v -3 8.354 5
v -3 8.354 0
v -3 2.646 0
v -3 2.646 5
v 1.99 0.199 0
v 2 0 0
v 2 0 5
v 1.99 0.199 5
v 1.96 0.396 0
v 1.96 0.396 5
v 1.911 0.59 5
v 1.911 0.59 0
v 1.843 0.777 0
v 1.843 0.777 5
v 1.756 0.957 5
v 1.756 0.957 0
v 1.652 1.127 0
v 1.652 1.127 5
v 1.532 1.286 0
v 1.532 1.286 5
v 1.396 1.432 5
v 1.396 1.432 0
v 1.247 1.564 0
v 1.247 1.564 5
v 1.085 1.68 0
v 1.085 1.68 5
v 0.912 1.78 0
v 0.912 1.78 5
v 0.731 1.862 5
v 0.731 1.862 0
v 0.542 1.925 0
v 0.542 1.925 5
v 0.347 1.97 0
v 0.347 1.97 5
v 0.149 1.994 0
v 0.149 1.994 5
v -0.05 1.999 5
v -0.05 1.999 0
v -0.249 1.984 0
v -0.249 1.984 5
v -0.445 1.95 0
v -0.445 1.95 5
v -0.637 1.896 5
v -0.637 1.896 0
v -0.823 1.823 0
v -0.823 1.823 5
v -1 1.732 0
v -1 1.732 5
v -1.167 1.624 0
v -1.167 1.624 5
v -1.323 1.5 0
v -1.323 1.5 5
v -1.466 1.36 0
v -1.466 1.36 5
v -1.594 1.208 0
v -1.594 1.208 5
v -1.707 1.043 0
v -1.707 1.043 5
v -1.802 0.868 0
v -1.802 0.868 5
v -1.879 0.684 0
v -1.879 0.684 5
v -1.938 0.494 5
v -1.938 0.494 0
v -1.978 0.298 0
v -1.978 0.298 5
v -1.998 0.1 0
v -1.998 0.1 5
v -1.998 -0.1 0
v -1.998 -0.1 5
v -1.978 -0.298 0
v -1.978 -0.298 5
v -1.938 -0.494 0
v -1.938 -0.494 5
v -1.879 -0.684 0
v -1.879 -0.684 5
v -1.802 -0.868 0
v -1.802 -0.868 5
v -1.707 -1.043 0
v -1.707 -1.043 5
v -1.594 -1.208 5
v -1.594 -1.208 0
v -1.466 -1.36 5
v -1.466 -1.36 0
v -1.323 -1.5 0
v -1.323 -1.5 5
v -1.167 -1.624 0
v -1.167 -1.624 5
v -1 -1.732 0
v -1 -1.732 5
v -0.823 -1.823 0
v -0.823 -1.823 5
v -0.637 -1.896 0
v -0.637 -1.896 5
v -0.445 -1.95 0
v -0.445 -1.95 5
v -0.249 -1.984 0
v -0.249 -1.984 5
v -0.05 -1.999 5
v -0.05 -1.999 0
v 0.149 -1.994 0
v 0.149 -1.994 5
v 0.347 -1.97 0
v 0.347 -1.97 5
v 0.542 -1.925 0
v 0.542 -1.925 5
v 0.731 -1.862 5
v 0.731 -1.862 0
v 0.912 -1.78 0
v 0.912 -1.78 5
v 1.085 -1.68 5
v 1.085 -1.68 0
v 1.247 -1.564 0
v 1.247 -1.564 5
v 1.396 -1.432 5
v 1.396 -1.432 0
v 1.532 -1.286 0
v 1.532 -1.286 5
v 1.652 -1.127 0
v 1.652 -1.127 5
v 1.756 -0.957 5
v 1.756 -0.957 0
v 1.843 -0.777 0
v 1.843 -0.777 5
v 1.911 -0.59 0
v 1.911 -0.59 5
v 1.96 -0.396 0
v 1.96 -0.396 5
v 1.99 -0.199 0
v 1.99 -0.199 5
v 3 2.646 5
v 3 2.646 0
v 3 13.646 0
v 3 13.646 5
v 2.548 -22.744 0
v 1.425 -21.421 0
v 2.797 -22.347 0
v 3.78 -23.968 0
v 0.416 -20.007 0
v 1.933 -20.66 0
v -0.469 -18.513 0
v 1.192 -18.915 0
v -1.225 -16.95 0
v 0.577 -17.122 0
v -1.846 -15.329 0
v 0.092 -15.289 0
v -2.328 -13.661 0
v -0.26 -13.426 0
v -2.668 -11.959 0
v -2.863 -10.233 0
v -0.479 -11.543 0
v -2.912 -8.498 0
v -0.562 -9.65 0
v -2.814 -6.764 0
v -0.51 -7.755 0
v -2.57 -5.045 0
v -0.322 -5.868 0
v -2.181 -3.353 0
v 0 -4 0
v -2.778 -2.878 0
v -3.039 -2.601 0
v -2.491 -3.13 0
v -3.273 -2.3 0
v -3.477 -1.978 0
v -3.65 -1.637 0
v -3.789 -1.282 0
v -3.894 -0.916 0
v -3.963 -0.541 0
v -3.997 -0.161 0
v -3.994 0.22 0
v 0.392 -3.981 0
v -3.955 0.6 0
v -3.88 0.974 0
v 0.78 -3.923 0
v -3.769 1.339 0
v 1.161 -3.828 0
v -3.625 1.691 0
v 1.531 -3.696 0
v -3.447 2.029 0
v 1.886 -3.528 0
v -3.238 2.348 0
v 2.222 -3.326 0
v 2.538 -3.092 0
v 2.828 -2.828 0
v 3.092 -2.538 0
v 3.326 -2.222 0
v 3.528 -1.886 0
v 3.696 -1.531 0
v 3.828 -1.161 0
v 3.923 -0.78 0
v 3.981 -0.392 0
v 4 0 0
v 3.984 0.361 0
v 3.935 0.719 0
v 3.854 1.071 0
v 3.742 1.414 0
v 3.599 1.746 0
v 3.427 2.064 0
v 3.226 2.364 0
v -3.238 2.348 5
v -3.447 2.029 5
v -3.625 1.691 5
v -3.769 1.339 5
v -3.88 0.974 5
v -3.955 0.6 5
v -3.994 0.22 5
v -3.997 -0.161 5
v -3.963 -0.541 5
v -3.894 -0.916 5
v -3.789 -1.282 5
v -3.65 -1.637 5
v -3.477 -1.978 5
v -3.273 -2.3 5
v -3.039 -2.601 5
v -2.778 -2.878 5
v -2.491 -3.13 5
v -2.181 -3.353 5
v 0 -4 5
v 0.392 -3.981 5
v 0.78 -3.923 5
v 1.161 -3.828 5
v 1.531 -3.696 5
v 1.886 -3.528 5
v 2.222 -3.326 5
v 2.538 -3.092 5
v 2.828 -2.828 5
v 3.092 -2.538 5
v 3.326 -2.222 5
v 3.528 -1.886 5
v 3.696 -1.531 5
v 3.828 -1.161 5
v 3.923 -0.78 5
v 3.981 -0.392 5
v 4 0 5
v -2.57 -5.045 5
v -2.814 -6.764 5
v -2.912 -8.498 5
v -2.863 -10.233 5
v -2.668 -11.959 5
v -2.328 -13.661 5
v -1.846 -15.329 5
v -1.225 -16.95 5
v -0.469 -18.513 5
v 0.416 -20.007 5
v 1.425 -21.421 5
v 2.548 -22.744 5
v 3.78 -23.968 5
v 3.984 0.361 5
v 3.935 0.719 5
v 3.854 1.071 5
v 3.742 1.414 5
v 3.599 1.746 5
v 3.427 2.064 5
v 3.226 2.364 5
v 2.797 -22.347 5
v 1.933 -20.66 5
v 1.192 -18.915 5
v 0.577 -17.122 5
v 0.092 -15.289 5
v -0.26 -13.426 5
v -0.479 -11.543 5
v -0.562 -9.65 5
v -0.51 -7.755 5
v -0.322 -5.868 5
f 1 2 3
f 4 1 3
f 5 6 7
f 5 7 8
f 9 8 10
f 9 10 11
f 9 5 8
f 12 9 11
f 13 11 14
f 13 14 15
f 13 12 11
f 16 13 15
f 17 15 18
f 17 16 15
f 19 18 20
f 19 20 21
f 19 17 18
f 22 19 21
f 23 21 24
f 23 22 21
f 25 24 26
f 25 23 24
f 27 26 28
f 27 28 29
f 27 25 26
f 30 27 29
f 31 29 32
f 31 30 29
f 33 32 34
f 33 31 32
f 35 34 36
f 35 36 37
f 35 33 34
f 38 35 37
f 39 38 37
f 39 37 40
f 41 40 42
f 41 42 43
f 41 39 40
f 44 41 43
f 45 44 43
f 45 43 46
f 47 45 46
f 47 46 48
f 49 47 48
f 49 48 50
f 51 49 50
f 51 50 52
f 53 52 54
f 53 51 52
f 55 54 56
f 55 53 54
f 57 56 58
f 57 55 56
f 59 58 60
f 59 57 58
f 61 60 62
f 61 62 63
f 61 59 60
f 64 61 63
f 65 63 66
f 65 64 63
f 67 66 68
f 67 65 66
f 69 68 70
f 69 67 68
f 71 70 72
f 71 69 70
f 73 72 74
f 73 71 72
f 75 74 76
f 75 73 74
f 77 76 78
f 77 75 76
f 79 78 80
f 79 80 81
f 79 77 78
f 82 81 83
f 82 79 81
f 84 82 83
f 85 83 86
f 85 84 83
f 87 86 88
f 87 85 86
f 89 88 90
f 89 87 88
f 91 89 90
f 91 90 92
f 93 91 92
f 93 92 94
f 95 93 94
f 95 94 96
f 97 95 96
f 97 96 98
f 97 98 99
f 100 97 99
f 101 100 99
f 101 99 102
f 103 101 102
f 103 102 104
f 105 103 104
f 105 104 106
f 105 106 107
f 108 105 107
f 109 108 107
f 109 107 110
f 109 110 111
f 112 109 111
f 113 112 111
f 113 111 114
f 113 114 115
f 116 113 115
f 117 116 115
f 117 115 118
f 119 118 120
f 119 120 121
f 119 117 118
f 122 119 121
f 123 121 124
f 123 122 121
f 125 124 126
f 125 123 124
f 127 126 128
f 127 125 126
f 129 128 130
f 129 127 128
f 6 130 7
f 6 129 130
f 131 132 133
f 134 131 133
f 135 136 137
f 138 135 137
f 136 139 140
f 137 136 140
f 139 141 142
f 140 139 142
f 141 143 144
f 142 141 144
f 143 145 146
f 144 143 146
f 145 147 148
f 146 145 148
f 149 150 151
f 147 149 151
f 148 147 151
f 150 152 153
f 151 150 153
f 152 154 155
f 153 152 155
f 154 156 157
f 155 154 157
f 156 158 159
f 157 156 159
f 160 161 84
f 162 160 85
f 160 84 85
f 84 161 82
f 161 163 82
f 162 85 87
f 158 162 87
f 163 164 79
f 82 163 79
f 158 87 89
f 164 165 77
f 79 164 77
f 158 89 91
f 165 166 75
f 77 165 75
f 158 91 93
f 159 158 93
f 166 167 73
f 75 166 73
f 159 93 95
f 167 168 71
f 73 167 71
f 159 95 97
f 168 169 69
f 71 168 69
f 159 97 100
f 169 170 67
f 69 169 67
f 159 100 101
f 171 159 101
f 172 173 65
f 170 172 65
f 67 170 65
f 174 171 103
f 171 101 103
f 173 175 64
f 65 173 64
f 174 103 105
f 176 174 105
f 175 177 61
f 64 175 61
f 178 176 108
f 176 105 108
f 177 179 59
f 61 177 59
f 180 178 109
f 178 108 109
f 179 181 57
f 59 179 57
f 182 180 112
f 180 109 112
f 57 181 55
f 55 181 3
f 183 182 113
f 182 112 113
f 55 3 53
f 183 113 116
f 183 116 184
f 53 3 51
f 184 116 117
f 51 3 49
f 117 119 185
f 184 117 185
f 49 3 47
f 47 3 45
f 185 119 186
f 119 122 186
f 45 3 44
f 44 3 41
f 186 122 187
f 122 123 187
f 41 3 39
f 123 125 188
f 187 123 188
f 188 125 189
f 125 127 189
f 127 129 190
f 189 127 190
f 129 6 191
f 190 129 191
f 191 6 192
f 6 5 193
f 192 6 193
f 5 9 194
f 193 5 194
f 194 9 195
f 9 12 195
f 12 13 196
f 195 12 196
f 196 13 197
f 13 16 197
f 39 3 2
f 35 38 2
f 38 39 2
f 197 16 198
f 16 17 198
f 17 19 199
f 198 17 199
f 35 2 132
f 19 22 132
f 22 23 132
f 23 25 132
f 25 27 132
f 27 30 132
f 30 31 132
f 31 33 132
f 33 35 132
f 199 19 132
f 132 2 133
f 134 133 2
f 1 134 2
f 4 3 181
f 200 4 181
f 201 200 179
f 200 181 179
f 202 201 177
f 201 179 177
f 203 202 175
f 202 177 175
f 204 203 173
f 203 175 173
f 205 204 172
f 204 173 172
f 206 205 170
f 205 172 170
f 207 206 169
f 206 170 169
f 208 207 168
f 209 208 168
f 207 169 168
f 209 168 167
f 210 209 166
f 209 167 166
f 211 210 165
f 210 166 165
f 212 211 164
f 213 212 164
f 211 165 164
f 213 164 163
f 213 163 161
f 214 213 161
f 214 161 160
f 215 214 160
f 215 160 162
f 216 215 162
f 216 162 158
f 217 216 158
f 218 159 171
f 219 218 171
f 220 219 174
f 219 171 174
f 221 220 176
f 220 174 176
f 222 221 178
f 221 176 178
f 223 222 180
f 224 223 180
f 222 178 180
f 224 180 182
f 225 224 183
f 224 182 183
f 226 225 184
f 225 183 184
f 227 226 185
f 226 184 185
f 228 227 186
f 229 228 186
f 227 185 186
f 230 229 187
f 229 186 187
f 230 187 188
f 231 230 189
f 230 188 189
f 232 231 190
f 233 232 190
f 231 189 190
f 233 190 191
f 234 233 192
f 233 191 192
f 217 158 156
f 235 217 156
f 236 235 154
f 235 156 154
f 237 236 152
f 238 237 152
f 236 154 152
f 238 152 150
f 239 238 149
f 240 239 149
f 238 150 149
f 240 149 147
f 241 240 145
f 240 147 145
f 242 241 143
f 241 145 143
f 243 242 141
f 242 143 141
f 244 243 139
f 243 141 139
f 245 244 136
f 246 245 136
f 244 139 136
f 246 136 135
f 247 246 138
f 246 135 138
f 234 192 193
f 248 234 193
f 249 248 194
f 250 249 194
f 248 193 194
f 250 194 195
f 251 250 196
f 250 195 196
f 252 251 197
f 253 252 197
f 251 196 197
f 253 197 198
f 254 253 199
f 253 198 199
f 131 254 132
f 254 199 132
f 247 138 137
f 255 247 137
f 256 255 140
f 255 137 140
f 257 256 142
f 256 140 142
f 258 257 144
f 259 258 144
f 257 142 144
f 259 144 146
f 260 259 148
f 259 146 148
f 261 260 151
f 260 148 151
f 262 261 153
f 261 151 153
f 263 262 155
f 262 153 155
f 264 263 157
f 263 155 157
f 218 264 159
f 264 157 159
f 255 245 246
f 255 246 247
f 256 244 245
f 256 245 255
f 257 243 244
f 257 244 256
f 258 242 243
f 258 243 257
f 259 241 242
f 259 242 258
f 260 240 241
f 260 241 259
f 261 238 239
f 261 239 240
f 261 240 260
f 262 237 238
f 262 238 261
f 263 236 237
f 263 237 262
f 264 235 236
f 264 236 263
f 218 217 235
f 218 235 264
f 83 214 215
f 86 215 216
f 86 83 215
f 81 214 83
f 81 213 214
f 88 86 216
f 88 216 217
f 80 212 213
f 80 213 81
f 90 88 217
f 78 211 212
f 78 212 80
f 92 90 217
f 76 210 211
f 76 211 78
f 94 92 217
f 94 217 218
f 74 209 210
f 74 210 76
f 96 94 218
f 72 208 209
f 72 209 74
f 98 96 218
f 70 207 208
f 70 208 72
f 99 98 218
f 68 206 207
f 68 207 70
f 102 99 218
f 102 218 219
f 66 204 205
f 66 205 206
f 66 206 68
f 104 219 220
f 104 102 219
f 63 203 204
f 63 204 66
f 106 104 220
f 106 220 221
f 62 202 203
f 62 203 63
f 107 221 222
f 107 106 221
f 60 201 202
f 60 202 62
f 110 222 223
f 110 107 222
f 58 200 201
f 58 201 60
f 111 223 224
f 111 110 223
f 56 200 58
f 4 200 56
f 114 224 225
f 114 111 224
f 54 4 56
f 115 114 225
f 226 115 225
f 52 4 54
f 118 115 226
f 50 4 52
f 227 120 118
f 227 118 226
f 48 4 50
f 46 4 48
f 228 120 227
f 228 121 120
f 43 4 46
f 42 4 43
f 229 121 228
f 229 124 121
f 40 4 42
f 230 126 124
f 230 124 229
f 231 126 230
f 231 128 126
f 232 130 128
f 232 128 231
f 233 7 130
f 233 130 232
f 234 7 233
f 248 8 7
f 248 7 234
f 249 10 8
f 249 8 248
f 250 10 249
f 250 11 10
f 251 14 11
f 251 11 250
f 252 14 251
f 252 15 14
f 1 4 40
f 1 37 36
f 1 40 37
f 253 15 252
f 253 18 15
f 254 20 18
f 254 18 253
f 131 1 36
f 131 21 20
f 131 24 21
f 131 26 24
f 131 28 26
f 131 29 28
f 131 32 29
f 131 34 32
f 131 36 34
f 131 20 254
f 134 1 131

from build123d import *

# Parameters (mm, degrees)
F0_R     = 2
F1_DEPTH = 5


with BuildPart() as f1:
    # F0 (on Top) → F1 (new body)
    with BuildSketch(Plane.XY):
        with BuildLine():
            ThreePointArc((-3, 2.645751), (0, 4), (3, 2.645751))
            Line((3, 2.645751), (3, 13.645751))
            Line((3, 13.645751), (-3, 8.354249))
            Line((-3, 8.354249), (-3, 2.645751))
        make_face()
        with BuildLine():
            ThreePointArc((0, -4), (2.828427, -2.828427), (4, 0))
            ThreePointArc((4, 0), (3.741657, 1.414214), (3, 2.645751))
            ThreePointArc((3, 2.645751), (0, 4), (-3, 2.645751))
            ThreePointArc((-3, 2.645751), (-3.963267, -0.540843), (-2.18141, -3.352827))
            ThreePointArc((-2.18141, -3.352827), (-1.137693, -3.834795), (0, -4))
        make_face()
        Circle(F0_R, mode=Mode.SUBTRACT)
        with BuildLine():
            ThreePointArc((3.779688, -23.968328), (-0.100807, -14.360962), (0, -4))
            ThreePointArc((0, -4), (-1.137693, -3.834795), (-2.18141, -3.352827))
            ThreePointArc((-2.18141, -3.352827), (-2.104688, -14.500237), (3.779688, -23.968328))
        make_face()
    extrude(amount=F1_DEPTH)


solid = f1.part
